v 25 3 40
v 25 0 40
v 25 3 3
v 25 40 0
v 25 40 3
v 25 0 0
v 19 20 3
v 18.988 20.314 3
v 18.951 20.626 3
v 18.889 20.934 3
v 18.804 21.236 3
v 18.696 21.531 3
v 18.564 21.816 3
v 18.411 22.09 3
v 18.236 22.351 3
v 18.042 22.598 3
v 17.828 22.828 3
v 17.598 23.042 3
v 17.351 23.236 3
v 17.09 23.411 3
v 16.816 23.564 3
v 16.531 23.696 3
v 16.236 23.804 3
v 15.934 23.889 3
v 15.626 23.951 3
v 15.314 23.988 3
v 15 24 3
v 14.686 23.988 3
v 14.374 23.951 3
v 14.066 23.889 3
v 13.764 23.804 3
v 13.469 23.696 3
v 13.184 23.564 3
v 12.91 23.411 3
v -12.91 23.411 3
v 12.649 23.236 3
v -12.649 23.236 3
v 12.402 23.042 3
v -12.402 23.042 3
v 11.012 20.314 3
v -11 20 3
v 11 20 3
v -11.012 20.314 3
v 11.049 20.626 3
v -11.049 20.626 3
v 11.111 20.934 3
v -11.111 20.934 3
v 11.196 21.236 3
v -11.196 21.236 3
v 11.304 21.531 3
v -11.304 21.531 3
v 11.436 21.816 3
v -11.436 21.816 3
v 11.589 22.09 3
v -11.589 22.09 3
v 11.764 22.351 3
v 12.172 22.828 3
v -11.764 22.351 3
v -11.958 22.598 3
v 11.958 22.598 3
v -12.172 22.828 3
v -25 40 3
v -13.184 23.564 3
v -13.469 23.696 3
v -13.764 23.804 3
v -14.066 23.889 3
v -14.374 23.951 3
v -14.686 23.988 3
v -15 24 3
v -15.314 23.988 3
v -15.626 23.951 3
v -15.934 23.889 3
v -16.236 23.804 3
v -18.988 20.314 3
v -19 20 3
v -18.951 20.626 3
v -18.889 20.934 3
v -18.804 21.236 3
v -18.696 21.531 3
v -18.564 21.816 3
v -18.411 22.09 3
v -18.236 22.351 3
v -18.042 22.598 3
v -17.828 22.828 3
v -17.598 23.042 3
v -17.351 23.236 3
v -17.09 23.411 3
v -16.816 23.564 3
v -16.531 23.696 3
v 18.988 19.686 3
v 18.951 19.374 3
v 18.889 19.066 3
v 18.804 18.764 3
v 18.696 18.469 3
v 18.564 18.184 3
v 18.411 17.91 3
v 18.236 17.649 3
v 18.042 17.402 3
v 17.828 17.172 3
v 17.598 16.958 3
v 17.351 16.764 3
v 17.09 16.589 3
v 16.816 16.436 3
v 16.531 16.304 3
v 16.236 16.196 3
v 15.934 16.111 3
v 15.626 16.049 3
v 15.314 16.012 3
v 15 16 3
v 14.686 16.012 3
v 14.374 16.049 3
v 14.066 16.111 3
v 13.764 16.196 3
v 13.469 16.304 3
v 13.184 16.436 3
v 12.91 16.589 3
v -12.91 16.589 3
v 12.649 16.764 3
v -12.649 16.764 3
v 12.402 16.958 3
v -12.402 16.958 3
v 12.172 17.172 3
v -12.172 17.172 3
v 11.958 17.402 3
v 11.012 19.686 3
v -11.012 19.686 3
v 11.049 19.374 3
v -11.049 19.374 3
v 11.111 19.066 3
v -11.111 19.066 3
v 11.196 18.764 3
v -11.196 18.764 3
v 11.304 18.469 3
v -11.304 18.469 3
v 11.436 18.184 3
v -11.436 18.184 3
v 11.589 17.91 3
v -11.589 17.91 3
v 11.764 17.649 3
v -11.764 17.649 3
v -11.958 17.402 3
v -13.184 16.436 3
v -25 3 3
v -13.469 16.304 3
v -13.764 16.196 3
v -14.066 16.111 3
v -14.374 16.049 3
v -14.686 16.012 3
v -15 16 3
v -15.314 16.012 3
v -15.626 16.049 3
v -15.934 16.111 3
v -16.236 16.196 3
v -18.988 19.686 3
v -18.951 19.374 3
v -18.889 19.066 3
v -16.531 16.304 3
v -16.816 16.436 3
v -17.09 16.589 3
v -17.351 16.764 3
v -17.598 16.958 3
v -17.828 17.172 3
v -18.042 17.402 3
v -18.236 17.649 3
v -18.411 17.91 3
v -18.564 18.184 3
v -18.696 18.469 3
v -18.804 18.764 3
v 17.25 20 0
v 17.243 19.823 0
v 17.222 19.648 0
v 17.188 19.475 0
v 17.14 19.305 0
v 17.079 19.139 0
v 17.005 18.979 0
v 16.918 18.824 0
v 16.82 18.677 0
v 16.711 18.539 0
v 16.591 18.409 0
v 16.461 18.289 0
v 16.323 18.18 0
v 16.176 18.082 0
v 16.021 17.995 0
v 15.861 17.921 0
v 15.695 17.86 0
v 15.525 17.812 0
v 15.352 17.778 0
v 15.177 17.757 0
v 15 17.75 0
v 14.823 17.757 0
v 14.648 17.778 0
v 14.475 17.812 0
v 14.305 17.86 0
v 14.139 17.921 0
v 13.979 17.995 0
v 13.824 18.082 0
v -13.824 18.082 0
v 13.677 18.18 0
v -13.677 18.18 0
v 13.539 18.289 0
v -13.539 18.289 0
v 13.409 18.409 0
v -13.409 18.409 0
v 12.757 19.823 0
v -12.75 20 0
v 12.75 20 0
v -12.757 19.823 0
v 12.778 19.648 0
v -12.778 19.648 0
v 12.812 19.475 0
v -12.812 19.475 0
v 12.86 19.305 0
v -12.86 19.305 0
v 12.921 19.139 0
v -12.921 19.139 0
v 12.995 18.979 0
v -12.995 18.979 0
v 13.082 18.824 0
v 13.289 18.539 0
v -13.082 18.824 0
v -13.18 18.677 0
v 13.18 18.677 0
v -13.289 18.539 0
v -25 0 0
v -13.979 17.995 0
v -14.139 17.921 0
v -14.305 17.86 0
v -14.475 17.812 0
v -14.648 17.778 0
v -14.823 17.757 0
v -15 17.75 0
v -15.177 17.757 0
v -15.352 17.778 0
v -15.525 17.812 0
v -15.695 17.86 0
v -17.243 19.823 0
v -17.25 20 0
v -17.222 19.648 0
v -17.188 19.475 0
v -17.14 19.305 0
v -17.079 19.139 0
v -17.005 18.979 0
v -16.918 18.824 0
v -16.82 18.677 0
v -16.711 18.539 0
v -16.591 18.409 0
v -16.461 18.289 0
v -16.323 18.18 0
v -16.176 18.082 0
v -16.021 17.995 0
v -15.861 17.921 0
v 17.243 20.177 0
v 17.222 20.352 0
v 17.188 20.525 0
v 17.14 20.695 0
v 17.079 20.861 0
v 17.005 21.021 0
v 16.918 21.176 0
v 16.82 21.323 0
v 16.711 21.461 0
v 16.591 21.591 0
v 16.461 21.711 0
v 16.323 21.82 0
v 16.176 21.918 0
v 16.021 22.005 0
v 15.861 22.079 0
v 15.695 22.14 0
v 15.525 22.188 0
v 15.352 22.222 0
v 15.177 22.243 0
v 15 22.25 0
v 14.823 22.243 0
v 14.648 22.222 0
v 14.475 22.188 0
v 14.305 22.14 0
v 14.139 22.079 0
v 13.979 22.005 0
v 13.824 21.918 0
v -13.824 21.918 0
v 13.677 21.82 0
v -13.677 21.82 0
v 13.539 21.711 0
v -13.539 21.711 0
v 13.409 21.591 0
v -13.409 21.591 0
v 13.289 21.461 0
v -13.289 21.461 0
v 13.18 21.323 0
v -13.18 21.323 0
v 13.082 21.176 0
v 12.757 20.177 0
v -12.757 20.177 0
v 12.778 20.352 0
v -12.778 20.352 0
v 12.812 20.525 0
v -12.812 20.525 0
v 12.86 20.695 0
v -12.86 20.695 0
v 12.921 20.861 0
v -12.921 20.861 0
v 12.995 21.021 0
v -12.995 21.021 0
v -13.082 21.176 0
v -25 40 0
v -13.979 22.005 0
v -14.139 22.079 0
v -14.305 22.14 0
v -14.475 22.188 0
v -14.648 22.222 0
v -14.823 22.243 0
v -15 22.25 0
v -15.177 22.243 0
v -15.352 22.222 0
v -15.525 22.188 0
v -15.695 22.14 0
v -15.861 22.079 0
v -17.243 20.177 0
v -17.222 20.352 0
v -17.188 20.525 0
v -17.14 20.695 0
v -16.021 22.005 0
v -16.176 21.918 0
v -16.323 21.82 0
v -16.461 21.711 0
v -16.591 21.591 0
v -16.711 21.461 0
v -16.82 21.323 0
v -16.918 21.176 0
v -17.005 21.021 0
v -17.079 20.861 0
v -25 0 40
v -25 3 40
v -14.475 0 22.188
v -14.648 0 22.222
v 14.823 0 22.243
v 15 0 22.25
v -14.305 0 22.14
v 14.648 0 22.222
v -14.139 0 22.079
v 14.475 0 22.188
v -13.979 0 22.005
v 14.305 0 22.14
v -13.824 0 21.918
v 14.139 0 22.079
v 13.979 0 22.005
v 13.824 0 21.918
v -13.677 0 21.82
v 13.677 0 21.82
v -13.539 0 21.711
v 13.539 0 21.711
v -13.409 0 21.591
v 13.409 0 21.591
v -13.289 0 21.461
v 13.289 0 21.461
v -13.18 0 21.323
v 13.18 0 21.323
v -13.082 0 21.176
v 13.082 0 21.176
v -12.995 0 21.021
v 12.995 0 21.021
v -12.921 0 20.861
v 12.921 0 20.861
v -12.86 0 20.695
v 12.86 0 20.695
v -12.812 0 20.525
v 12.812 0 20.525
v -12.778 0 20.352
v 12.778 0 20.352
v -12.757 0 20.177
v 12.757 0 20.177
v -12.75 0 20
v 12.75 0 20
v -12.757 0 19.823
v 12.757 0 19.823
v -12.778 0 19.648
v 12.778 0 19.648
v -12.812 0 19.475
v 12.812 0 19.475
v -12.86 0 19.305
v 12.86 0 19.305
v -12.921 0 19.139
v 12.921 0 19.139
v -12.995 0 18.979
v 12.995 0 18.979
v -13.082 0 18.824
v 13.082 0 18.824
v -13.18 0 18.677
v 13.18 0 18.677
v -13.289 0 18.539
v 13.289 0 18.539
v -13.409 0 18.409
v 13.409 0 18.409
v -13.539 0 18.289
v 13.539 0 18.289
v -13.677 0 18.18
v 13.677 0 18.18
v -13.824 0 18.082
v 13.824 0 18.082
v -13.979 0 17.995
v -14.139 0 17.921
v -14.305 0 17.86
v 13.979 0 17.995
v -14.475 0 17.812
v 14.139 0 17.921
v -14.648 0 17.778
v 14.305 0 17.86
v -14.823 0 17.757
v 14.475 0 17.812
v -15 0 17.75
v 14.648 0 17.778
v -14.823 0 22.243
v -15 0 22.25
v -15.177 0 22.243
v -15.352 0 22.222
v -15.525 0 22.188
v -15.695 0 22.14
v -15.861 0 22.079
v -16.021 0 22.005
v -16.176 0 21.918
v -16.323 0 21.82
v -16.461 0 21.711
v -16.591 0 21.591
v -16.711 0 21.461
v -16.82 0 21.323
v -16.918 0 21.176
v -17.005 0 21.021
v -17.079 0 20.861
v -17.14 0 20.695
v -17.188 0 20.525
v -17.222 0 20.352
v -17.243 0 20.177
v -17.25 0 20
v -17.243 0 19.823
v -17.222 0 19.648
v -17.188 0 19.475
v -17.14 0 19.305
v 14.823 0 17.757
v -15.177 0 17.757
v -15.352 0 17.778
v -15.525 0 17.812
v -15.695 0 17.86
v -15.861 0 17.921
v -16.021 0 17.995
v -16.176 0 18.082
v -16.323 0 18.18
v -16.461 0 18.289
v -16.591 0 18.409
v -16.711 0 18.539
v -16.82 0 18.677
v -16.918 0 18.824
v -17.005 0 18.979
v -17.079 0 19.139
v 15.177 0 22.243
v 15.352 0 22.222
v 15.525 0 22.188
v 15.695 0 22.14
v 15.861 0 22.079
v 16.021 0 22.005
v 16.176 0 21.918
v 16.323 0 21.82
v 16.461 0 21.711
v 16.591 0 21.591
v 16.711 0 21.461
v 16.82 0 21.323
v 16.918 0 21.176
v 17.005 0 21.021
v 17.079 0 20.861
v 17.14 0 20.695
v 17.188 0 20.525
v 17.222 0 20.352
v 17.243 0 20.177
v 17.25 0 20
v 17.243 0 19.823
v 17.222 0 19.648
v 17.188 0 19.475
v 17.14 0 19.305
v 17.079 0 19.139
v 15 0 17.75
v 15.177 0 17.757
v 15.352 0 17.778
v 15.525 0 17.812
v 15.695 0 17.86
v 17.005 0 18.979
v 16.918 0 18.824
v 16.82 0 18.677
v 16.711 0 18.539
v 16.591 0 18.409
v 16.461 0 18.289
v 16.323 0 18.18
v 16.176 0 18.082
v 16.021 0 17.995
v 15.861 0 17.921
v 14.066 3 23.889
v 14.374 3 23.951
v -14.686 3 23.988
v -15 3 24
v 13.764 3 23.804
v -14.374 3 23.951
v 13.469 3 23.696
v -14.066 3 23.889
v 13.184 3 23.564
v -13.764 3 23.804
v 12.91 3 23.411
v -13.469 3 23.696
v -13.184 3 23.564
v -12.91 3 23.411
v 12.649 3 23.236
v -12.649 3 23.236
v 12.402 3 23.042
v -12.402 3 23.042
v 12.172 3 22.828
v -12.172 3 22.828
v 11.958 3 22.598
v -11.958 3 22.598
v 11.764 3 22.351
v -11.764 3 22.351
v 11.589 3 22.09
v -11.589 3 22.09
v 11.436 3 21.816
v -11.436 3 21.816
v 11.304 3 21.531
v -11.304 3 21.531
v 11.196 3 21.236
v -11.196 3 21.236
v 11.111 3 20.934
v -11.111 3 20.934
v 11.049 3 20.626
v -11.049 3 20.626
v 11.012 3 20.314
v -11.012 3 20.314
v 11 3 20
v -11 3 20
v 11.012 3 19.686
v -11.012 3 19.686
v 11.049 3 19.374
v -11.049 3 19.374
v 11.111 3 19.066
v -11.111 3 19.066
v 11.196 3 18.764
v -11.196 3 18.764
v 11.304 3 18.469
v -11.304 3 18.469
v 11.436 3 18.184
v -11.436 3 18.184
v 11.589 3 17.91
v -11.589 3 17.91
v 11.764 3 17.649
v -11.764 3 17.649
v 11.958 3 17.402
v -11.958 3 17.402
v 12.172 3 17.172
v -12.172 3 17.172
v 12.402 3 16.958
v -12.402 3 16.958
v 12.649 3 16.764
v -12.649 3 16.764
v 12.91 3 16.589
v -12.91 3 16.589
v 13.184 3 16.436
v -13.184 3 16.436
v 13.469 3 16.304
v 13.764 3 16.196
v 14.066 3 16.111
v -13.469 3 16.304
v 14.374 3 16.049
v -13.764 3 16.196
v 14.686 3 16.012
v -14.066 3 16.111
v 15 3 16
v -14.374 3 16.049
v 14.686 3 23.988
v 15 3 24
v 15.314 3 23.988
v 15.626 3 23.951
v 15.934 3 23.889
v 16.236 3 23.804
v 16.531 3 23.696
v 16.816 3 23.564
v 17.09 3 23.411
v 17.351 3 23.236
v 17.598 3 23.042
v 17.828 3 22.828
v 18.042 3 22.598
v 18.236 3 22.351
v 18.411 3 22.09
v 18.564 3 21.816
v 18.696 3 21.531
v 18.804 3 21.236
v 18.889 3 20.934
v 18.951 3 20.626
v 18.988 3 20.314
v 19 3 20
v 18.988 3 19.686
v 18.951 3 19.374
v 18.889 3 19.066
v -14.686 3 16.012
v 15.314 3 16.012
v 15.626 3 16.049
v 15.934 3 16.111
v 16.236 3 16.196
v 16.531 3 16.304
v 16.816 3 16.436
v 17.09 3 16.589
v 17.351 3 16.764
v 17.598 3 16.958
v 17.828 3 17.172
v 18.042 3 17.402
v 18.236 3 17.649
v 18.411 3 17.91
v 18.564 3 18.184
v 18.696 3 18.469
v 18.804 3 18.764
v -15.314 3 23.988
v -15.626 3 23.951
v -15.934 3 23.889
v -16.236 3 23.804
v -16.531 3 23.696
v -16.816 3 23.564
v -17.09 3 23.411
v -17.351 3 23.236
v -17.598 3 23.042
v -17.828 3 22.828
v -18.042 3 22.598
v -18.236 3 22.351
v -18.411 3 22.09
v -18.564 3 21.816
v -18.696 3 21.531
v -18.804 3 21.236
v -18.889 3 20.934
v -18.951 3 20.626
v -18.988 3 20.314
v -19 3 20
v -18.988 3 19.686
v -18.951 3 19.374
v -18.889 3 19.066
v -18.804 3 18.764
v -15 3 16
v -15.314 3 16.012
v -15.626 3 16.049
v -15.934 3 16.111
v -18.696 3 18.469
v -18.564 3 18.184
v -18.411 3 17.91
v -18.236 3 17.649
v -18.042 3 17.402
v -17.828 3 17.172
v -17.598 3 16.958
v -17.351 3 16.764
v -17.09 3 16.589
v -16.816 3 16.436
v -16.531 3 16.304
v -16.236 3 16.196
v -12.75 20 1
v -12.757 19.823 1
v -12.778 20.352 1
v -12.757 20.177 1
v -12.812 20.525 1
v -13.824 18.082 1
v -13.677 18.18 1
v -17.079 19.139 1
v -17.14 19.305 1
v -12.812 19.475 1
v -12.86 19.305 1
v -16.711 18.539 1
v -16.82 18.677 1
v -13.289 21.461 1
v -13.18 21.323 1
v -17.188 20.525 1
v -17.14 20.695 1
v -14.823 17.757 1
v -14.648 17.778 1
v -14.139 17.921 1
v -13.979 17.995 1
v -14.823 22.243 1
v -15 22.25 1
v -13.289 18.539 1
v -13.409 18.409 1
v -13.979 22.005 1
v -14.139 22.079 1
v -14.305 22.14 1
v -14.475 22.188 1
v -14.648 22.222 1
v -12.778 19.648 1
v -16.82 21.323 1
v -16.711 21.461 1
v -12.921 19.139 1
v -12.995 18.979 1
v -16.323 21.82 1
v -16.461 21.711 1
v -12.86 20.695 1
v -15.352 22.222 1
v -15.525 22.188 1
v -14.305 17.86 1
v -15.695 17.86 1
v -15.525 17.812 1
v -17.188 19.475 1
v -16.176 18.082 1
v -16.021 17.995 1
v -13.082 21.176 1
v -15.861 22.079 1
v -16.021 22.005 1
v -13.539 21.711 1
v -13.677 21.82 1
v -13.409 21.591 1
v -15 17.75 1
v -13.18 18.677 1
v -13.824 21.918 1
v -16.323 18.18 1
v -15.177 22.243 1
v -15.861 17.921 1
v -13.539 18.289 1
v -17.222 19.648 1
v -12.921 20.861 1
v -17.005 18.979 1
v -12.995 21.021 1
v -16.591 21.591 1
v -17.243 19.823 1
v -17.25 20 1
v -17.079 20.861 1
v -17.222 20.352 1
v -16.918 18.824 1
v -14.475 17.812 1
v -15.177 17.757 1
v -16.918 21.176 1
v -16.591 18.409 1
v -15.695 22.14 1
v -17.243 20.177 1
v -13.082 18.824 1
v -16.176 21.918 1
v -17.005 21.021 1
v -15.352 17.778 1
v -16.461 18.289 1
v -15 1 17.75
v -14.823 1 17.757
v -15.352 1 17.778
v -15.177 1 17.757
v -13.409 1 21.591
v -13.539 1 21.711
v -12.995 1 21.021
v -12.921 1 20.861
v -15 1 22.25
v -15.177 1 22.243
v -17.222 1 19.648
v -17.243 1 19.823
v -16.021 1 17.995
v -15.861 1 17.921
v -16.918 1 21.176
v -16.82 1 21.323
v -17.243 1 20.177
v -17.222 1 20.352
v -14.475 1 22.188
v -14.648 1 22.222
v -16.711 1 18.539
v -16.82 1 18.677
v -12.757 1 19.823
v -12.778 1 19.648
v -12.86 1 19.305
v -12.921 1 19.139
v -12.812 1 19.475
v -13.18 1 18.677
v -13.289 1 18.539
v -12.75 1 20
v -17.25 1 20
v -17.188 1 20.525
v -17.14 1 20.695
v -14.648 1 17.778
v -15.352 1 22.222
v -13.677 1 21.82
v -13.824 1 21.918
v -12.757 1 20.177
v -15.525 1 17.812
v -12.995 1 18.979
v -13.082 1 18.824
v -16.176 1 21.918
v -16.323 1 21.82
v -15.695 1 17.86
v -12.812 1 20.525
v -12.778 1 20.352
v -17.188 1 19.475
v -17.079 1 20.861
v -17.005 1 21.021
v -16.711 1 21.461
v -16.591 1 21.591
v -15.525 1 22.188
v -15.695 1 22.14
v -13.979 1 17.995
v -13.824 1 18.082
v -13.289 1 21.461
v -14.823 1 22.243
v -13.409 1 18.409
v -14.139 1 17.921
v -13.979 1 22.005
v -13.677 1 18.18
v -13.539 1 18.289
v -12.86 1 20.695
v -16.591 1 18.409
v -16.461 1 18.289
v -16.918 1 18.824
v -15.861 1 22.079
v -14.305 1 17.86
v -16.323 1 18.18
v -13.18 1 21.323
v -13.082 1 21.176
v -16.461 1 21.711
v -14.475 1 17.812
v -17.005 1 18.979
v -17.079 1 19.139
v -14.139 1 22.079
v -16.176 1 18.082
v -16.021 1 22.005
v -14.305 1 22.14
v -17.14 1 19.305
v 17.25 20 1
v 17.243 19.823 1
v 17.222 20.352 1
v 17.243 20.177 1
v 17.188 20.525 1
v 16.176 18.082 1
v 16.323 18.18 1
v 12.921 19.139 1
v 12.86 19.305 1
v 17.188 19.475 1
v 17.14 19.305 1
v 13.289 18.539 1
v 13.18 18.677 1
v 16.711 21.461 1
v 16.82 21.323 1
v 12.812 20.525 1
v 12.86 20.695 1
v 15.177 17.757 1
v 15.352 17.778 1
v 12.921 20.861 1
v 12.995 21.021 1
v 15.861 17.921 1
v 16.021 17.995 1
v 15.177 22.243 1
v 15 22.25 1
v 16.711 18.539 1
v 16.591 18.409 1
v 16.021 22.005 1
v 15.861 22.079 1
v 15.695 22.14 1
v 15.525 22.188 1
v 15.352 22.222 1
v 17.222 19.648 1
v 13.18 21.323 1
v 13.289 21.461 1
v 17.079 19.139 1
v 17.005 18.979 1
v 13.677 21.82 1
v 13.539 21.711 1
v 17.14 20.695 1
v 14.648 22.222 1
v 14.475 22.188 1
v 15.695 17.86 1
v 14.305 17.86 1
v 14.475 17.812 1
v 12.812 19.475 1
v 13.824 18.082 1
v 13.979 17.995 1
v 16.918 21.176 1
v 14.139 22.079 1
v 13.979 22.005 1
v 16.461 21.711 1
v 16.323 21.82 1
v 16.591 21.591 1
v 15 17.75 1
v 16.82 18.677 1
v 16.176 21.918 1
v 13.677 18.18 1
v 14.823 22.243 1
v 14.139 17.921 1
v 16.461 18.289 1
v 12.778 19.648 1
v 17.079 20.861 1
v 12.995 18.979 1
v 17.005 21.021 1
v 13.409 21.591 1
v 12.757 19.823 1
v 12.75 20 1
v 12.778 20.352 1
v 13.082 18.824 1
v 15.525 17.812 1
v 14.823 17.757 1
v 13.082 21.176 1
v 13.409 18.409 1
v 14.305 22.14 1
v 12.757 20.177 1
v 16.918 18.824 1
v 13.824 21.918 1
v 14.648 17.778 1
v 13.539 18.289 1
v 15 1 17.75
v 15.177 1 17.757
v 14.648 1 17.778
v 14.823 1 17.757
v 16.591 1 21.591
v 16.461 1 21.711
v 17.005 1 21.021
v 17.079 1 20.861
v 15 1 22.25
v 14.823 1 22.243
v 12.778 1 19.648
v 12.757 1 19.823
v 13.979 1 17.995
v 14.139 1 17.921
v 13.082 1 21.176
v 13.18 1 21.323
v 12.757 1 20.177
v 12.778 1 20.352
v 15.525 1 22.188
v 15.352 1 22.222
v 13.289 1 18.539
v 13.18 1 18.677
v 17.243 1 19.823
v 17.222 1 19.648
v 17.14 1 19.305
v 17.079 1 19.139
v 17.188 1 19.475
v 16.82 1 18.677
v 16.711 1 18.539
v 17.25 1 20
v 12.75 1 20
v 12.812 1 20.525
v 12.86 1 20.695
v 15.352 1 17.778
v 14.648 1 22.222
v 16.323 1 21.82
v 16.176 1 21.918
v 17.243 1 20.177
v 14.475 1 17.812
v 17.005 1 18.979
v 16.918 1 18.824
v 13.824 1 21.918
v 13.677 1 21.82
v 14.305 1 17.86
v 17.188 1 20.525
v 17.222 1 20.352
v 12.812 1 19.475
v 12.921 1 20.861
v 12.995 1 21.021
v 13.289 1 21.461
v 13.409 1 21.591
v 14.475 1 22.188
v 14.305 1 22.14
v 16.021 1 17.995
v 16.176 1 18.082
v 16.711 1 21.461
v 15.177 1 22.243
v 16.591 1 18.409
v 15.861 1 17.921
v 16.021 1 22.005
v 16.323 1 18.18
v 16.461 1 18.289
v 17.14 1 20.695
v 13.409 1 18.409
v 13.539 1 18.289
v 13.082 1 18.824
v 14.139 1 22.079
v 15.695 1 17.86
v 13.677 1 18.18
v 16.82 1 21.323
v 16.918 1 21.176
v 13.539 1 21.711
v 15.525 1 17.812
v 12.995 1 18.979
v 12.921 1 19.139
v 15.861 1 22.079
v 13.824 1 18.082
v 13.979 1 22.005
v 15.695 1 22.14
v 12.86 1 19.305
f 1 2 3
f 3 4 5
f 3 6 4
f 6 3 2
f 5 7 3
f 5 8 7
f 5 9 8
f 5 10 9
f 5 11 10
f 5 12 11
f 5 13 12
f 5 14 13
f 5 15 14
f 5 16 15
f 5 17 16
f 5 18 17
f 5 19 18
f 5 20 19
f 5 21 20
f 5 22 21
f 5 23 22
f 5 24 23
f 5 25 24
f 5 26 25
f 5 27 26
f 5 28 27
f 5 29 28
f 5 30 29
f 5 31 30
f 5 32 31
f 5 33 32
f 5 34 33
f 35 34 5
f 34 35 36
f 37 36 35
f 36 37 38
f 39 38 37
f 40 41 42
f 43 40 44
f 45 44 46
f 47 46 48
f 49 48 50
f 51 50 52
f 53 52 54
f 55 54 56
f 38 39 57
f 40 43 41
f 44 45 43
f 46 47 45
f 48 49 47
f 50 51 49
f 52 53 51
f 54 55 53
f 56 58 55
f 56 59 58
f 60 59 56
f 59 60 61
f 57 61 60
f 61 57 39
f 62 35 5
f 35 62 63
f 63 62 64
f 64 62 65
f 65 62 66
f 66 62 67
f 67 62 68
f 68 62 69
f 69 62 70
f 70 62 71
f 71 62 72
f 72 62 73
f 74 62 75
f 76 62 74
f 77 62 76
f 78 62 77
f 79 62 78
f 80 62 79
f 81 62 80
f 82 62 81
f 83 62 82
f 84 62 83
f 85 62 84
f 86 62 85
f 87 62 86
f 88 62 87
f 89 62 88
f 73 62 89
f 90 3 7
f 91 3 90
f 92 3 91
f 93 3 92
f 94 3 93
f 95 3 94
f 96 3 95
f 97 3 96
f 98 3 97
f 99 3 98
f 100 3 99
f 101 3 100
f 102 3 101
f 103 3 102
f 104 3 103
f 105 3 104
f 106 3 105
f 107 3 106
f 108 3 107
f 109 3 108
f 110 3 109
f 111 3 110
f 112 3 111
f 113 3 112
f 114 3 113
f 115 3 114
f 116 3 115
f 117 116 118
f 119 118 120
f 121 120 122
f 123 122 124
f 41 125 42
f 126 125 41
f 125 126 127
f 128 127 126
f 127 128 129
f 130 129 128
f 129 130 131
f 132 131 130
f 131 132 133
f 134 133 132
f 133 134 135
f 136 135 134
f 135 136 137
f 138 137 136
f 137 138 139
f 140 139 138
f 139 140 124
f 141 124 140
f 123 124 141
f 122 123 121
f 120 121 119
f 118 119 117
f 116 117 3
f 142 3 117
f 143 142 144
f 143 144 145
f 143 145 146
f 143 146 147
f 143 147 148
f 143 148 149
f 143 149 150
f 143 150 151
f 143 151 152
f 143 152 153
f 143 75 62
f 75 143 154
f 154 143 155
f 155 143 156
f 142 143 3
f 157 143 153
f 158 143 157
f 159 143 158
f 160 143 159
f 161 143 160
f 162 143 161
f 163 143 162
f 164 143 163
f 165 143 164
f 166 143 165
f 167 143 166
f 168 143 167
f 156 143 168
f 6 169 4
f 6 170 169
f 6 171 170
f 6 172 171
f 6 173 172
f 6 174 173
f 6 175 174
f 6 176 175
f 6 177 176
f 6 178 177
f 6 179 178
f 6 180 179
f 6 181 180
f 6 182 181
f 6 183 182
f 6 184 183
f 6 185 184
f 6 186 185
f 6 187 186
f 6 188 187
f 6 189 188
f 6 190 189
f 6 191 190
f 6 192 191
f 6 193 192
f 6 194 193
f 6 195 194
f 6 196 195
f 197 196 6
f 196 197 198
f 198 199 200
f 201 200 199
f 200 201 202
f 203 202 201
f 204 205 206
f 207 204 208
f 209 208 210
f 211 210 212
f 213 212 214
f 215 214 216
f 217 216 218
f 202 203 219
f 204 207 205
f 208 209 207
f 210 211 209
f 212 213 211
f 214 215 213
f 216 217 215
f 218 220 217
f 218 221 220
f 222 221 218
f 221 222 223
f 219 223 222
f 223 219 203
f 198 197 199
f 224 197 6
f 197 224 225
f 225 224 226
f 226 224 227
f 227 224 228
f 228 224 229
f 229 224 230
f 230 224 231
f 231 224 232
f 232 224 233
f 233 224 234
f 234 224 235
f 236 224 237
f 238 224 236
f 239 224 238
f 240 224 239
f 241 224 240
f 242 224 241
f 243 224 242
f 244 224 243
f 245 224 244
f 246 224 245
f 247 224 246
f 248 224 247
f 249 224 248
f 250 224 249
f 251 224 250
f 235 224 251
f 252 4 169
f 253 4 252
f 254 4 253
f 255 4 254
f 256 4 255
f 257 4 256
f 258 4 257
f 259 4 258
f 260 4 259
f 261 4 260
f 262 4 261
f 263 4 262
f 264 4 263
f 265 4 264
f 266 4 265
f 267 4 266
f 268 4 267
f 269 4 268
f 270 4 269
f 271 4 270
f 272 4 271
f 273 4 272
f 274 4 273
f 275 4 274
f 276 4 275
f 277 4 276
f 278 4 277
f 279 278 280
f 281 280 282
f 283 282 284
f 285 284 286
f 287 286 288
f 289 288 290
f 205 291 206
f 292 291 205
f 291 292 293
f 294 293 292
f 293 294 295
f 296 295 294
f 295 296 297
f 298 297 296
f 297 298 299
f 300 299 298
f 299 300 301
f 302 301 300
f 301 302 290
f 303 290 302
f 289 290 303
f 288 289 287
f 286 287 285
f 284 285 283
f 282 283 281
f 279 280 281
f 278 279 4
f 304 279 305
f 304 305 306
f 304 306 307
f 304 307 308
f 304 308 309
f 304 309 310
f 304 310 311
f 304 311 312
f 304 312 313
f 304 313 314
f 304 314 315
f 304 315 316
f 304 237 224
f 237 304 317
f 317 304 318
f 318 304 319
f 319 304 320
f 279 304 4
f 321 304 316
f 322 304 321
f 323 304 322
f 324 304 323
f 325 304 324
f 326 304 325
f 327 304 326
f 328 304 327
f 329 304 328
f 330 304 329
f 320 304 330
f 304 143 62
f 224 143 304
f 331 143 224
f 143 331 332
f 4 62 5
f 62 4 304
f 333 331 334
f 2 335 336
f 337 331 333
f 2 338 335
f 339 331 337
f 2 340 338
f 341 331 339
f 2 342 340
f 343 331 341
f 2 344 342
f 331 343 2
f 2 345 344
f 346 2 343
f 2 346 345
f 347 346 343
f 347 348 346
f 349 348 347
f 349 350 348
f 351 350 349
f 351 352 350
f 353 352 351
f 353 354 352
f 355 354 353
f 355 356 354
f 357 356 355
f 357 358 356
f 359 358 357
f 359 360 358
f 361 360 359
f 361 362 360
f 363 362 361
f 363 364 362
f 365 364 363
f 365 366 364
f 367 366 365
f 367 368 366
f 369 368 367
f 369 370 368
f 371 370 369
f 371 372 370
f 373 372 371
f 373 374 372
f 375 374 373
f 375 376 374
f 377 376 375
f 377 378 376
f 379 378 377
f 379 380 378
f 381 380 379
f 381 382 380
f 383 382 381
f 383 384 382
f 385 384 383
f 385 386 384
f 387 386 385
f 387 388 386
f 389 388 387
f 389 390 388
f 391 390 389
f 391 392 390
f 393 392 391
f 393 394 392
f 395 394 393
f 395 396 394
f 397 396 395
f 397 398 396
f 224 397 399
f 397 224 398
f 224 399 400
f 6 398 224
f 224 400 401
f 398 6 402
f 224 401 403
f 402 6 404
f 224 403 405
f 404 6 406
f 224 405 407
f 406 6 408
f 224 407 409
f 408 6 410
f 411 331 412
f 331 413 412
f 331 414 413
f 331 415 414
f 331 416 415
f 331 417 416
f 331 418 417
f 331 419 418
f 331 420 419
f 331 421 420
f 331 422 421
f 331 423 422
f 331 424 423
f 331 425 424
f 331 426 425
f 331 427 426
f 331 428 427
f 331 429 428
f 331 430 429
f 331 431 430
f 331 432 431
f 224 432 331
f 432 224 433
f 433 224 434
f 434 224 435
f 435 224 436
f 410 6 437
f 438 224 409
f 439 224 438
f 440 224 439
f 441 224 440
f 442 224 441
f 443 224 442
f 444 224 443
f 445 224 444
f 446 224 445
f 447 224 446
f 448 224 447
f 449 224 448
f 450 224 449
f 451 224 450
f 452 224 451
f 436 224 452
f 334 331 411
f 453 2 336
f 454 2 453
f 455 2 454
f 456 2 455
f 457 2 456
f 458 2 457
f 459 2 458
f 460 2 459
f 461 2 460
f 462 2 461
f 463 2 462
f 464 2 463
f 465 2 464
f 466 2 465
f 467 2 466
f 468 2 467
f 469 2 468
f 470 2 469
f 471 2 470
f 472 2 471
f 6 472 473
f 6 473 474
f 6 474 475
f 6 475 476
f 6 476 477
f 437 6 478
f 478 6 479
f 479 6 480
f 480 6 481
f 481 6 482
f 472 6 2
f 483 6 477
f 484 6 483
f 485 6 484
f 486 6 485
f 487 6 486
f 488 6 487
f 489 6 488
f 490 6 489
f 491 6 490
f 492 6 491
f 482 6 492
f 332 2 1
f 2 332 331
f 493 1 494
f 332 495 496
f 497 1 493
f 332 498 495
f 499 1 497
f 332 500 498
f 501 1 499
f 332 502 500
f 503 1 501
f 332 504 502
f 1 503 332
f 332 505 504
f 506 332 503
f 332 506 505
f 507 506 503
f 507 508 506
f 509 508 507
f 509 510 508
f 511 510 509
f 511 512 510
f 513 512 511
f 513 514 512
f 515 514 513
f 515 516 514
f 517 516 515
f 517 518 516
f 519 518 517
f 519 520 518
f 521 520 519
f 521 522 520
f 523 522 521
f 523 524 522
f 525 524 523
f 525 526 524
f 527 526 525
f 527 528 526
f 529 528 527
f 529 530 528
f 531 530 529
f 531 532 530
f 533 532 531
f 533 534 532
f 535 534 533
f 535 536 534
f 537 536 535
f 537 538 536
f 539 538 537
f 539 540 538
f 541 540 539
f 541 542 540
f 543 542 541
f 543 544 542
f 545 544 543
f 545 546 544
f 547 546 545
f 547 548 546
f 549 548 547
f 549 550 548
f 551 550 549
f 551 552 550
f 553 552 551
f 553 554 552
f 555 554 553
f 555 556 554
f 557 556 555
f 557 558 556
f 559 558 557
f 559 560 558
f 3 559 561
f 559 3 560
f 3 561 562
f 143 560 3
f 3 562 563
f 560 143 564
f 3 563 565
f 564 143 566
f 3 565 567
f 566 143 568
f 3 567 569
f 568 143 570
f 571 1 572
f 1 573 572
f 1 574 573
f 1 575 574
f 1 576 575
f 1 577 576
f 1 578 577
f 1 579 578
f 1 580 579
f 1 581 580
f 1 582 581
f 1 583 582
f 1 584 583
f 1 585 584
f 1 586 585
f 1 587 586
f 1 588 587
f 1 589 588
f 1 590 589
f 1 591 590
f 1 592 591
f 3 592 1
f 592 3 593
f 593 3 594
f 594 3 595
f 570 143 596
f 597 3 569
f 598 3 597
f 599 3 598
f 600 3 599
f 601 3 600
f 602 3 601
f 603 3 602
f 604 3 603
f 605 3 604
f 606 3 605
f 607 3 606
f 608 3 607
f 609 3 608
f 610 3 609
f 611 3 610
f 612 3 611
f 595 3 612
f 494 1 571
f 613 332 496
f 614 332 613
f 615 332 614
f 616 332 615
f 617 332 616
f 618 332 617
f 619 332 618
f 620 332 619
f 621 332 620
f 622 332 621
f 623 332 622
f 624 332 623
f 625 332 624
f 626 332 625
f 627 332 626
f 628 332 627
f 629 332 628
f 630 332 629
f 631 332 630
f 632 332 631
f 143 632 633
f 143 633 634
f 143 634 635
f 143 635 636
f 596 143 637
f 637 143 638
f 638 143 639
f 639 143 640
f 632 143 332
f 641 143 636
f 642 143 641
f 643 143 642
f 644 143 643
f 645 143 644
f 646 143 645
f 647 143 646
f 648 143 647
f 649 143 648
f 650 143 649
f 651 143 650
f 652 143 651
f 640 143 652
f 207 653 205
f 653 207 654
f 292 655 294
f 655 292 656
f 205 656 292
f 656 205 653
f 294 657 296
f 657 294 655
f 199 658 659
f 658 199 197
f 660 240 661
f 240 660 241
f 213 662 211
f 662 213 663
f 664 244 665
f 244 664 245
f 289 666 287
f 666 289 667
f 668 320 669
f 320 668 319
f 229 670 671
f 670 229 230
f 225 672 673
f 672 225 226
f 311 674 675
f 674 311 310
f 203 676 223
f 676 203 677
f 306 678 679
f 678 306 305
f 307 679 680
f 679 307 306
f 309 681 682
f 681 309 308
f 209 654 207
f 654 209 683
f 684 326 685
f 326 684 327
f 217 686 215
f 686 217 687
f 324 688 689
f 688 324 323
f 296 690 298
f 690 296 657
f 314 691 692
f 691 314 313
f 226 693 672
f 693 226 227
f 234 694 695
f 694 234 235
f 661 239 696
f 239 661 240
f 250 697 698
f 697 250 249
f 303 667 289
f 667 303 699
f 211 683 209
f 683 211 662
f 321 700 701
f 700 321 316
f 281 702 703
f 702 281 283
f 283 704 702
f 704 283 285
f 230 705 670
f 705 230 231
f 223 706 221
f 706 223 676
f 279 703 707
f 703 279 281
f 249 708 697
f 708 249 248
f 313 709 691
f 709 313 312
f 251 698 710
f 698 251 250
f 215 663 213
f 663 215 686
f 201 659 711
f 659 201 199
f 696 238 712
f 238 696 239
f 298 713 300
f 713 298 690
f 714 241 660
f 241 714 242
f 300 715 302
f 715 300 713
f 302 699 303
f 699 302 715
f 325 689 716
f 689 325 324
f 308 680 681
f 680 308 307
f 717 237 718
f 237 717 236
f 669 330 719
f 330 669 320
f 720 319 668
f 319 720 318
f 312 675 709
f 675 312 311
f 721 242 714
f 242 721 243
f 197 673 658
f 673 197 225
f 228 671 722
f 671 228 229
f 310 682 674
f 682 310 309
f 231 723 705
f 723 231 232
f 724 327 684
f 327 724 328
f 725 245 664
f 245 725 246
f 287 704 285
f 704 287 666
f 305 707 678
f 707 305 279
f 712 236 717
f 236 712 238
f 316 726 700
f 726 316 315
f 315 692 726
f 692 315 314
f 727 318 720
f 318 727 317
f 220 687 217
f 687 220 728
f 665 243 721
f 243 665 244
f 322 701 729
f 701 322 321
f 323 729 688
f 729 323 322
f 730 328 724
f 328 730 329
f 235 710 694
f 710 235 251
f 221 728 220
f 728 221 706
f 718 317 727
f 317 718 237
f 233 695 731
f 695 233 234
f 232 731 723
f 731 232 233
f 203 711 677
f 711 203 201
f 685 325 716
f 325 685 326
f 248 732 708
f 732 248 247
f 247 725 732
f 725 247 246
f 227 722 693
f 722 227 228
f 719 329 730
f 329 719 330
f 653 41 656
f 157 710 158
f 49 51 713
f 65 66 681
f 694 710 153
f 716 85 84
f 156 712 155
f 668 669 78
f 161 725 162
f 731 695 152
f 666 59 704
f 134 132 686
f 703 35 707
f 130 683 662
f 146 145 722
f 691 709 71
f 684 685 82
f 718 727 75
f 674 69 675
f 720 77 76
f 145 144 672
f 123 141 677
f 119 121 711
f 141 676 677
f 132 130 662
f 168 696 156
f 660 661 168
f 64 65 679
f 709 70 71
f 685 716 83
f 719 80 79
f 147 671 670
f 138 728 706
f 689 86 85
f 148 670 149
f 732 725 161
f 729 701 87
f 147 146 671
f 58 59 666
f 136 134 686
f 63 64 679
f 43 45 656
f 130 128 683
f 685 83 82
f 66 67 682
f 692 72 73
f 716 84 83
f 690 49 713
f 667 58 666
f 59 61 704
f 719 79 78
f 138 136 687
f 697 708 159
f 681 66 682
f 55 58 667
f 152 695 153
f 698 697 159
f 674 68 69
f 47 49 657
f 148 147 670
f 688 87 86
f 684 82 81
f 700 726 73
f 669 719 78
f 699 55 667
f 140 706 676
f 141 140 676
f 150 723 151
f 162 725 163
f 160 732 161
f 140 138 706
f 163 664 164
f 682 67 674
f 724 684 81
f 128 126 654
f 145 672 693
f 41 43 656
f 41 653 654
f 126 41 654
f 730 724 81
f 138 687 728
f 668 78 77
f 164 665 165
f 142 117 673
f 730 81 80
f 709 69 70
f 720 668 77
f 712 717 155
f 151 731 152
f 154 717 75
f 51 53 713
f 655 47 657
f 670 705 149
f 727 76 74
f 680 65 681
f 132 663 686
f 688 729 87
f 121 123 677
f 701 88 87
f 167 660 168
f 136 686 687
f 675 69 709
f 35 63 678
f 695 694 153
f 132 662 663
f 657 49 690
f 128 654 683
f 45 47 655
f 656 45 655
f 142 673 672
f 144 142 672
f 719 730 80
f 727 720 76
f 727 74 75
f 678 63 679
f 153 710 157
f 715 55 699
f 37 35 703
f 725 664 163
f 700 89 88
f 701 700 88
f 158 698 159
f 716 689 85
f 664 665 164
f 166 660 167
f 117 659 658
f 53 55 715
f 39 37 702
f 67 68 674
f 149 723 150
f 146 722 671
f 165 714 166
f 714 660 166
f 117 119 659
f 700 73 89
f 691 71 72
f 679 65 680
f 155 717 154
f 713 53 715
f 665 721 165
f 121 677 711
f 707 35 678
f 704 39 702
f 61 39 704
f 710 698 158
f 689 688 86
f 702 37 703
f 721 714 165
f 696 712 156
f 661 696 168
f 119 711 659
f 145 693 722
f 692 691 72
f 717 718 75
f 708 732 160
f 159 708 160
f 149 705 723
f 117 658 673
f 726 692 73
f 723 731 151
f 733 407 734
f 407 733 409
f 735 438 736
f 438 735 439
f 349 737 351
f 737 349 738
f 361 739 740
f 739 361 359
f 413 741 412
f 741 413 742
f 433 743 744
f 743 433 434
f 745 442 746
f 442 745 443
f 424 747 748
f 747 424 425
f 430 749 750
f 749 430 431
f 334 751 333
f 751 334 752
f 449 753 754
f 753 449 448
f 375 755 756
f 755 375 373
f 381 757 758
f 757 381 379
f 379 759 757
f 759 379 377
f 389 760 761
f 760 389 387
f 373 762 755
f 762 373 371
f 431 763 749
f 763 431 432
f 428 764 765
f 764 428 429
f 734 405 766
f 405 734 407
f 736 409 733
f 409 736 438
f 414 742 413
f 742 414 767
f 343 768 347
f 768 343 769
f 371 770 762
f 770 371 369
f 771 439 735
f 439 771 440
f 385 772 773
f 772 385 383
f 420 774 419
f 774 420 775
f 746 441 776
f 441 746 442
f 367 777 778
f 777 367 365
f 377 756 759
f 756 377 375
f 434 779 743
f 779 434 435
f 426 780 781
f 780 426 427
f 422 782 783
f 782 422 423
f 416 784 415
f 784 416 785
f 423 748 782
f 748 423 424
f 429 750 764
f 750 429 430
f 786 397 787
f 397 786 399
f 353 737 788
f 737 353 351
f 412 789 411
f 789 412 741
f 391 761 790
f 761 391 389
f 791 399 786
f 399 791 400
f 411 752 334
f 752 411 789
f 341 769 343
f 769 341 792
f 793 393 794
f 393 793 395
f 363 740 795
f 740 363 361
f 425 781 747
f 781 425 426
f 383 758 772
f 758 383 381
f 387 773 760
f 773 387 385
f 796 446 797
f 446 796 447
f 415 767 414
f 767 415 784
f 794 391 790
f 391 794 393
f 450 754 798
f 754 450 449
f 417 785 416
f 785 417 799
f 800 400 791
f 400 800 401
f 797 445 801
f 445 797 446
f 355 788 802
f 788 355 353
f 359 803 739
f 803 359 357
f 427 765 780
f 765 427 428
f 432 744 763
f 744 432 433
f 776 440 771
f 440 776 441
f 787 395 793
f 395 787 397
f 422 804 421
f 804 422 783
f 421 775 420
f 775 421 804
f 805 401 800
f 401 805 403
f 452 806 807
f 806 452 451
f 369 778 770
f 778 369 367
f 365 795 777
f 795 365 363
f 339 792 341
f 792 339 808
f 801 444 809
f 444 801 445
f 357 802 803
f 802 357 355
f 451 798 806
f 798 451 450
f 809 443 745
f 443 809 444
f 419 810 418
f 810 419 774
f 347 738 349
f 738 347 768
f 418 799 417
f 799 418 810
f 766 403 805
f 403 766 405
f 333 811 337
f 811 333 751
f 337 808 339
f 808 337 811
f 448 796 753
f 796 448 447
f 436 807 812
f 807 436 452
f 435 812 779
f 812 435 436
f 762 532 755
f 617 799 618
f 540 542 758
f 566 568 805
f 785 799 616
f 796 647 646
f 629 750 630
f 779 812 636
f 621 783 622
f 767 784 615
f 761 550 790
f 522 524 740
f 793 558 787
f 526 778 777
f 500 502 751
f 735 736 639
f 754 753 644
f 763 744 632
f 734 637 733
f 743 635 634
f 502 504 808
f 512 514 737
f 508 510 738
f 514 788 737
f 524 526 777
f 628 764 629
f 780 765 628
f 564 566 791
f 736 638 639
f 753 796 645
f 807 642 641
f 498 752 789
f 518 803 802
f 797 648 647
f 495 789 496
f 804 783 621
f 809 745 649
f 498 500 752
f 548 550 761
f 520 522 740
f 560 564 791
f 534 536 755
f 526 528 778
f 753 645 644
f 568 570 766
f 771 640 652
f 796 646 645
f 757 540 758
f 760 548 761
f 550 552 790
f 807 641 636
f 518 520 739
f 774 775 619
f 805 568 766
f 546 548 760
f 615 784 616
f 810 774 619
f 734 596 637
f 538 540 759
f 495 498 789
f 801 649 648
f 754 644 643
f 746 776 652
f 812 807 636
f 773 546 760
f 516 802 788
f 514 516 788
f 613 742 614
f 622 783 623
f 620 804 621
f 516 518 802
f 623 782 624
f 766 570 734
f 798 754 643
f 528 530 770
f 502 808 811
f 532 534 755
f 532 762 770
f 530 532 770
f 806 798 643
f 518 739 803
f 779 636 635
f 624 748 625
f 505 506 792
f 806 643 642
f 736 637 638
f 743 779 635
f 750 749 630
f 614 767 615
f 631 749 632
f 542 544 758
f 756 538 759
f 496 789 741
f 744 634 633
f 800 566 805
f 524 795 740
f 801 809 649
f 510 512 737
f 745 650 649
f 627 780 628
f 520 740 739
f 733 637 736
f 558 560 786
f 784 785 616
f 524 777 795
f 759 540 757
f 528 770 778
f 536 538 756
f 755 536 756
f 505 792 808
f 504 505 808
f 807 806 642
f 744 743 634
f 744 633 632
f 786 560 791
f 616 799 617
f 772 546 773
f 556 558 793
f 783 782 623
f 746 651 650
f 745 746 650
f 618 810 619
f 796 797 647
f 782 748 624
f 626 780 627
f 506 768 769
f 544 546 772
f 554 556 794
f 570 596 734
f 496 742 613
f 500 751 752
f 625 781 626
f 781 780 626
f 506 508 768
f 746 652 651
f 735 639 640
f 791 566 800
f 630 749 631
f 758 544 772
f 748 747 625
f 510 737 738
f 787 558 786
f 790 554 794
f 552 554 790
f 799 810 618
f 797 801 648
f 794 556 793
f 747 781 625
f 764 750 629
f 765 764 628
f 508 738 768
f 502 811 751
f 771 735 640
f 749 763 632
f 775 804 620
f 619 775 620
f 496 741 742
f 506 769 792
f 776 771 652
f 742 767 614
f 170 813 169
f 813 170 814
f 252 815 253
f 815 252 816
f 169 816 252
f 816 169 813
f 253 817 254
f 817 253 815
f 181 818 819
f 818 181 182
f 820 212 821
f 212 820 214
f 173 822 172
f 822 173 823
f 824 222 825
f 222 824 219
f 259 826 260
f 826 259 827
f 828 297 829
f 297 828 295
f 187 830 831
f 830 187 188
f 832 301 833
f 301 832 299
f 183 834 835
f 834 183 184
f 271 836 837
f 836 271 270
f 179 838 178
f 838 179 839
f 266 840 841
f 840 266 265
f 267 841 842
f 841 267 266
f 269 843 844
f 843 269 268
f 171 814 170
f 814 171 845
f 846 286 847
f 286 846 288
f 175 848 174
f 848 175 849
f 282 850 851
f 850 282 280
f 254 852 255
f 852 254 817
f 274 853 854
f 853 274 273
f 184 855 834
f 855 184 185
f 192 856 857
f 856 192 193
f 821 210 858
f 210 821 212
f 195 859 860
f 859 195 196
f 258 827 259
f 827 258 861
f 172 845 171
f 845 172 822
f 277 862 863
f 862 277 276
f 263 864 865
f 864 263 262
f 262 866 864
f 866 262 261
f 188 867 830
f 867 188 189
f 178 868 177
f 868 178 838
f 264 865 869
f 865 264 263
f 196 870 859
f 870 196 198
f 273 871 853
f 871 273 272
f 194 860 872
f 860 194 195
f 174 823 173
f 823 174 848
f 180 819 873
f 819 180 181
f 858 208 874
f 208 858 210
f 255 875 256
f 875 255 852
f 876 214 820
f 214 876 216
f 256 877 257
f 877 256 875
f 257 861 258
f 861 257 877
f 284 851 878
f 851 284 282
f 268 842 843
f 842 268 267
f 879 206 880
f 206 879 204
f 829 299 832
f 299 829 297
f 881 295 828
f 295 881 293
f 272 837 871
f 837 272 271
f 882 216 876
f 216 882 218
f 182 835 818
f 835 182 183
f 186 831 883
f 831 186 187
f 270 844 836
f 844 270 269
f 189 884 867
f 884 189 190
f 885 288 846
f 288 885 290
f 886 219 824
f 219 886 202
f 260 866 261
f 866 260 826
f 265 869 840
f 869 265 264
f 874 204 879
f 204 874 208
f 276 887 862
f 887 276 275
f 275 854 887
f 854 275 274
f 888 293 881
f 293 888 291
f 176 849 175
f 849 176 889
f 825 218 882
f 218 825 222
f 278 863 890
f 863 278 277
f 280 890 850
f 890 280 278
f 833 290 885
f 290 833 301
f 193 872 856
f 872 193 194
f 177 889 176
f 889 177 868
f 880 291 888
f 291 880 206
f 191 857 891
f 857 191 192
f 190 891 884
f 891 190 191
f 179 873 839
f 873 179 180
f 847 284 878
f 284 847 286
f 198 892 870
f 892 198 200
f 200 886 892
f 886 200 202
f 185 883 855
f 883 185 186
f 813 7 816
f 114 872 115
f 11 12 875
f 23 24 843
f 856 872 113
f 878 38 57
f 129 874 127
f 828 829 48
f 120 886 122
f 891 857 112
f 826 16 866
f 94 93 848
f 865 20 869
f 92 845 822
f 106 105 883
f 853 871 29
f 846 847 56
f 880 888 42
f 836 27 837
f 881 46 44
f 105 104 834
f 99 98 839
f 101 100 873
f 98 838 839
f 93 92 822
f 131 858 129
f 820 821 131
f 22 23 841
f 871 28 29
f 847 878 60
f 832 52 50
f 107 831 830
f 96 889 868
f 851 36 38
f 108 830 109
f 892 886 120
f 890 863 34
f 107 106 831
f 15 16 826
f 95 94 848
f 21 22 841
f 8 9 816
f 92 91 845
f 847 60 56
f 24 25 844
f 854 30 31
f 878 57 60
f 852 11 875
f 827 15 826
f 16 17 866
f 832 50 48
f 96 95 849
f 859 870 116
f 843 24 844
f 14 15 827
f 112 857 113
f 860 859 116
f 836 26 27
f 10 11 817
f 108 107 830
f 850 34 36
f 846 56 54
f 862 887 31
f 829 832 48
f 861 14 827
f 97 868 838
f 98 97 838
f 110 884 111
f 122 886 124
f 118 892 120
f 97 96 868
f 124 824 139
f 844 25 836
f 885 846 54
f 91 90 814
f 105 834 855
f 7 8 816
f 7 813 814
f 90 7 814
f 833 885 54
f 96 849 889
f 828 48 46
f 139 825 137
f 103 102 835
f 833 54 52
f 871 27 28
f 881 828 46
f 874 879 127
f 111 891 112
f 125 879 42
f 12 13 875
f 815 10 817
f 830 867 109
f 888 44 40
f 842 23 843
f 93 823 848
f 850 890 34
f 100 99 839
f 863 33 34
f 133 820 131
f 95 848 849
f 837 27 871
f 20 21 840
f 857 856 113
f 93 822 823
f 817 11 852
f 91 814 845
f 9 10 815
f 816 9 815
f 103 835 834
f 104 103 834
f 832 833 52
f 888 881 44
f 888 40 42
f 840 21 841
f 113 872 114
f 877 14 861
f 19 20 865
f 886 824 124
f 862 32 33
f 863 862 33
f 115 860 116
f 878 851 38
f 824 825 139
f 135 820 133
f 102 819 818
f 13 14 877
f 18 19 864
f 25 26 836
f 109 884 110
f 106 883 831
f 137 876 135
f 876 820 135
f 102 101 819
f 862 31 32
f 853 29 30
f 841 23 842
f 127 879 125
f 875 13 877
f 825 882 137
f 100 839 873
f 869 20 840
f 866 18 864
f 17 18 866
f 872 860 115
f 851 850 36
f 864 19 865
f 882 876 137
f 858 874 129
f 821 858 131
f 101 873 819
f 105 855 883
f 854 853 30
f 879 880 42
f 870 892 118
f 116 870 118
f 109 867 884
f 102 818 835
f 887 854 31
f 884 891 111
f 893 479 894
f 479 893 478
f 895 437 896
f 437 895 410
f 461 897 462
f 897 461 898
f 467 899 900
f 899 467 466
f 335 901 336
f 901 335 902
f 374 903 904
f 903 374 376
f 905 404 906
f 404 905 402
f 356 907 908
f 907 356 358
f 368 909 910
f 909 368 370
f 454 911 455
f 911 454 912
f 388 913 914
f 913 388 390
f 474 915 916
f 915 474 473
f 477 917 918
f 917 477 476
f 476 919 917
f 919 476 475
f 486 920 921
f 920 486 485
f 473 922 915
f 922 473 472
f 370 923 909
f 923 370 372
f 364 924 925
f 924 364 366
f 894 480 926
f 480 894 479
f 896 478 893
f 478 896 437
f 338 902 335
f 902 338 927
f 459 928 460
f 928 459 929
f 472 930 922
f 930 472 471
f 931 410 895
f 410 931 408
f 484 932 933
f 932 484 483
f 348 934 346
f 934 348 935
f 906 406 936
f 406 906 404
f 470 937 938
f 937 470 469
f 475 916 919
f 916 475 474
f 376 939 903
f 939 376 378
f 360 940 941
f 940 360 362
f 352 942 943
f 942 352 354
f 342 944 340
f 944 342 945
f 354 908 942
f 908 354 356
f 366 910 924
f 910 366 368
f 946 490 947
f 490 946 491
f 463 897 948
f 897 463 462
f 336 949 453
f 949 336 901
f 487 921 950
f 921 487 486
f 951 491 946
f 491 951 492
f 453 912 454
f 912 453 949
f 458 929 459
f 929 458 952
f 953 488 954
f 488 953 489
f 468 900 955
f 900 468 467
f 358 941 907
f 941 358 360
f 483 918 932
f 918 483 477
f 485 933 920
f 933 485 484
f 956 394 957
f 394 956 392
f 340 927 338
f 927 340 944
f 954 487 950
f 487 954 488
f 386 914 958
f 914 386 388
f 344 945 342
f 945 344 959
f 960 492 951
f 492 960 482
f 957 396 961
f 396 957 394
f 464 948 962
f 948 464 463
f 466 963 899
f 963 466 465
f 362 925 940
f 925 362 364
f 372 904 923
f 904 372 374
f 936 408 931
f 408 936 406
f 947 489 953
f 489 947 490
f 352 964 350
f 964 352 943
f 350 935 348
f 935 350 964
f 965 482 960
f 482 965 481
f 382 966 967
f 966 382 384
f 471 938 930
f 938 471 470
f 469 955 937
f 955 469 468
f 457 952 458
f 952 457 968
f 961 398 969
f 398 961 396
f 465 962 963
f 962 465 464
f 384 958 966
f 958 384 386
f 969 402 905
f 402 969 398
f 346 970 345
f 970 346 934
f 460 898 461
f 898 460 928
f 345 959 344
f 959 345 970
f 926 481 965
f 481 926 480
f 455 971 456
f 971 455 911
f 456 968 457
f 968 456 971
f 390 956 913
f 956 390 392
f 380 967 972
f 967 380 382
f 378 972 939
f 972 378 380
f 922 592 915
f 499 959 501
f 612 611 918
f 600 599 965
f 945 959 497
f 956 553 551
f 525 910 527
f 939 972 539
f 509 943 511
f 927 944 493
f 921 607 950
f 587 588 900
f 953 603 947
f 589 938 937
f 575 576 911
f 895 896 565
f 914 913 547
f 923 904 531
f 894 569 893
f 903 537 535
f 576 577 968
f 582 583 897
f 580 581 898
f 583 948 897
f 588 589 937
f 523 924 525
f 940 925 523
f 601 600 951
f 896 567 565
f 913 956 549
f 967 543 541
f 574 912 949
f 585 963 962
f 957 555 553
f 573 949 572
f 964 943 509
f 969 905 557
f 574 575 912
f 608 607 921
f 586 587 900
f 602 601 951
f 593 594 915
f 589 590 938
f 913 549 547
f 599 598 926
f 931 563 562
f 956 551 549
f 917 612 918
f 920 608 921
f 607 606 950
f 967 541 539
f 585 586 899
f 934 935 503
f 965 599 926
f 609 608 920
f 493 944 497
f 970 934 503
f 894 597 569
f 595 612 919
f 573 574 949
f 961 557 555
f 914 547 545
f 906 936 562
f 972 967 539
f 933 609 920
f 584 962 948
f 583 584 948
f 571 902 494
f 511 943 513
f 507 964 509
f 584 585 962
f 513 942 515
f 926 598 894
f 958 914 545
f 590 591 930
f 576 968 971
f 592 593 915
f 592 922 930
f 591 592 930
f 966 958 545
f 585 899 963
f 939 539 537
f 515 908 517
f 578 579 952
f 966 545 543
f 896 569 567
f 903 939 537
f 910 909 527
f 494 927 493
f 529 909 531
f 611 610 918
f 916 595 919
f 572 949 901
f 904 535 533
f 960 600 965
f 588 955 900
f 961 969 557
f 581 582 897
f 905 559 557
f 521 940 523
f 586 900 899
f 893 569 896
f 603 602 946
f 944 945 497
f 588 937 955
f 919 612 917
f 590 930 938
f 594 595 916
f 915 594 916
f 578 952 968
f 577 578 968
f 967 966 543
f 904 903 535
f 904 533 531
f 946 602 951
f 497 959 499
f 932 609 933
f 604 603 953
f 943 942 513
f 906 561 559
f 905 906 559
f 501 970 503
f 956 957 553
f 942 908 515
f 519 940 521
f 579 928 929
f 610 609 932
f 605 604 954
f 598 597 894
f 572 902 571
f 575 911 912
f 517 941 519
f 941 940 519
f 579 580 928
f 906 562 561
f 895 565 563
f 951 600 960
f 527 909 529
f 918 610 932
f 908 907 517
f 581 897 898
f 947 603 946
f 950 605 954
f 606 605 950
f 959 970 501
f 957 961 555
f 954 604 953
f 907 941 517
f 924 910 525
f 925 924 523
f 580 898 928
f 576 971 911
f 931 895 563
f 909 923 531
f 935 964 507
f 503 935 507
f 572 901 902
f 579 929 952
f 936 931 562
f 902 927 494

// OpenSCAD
$fn = 80;

width = 50;
depth = 40;
height = 40;
thickness = 3;

hole_d = 4.5;
cs_d = 8;
cs_depth = 2;

hole_offset = width / 2 - 10;
depth_center = depth / 2;
height_center = height / 2;

module horizontal_hole(x_pos) {
    translate([x_pos, depth_center, 0]) {
        cylinder(h = thickness, r = hole_d / 2);
        translate([0, 0, thickness - cs_depth])
            cylinder(h = cs_depth, r1 = hole_d / 2, r2 = cs_d / 2);
    }
}

module vertical_hole(x_pos) {
    translate([x_pos, 0, height_center])
        rotate([-90, 0, 0]) {
            cylinder(h = thickness, r = hole_d / 2);
            translate([0, 0, thickness - cs_depth])
                cylinder(h = cs_depth, r1 = hole_d / 2, r2 = cs_d / 2);
        }
}

difference() {
    union() {
        translate([-width / 2, 0, 0]) cube([width, depth, thickness]);
        translate([-width / 2, 0, 0]) cube([width, thickness, height]);
    }
    for (x_pos = [-hole_offset, hole_offset]) {
        horizontal_hole(x_pos);
        vertical_hole(x_pos);
    }
}
